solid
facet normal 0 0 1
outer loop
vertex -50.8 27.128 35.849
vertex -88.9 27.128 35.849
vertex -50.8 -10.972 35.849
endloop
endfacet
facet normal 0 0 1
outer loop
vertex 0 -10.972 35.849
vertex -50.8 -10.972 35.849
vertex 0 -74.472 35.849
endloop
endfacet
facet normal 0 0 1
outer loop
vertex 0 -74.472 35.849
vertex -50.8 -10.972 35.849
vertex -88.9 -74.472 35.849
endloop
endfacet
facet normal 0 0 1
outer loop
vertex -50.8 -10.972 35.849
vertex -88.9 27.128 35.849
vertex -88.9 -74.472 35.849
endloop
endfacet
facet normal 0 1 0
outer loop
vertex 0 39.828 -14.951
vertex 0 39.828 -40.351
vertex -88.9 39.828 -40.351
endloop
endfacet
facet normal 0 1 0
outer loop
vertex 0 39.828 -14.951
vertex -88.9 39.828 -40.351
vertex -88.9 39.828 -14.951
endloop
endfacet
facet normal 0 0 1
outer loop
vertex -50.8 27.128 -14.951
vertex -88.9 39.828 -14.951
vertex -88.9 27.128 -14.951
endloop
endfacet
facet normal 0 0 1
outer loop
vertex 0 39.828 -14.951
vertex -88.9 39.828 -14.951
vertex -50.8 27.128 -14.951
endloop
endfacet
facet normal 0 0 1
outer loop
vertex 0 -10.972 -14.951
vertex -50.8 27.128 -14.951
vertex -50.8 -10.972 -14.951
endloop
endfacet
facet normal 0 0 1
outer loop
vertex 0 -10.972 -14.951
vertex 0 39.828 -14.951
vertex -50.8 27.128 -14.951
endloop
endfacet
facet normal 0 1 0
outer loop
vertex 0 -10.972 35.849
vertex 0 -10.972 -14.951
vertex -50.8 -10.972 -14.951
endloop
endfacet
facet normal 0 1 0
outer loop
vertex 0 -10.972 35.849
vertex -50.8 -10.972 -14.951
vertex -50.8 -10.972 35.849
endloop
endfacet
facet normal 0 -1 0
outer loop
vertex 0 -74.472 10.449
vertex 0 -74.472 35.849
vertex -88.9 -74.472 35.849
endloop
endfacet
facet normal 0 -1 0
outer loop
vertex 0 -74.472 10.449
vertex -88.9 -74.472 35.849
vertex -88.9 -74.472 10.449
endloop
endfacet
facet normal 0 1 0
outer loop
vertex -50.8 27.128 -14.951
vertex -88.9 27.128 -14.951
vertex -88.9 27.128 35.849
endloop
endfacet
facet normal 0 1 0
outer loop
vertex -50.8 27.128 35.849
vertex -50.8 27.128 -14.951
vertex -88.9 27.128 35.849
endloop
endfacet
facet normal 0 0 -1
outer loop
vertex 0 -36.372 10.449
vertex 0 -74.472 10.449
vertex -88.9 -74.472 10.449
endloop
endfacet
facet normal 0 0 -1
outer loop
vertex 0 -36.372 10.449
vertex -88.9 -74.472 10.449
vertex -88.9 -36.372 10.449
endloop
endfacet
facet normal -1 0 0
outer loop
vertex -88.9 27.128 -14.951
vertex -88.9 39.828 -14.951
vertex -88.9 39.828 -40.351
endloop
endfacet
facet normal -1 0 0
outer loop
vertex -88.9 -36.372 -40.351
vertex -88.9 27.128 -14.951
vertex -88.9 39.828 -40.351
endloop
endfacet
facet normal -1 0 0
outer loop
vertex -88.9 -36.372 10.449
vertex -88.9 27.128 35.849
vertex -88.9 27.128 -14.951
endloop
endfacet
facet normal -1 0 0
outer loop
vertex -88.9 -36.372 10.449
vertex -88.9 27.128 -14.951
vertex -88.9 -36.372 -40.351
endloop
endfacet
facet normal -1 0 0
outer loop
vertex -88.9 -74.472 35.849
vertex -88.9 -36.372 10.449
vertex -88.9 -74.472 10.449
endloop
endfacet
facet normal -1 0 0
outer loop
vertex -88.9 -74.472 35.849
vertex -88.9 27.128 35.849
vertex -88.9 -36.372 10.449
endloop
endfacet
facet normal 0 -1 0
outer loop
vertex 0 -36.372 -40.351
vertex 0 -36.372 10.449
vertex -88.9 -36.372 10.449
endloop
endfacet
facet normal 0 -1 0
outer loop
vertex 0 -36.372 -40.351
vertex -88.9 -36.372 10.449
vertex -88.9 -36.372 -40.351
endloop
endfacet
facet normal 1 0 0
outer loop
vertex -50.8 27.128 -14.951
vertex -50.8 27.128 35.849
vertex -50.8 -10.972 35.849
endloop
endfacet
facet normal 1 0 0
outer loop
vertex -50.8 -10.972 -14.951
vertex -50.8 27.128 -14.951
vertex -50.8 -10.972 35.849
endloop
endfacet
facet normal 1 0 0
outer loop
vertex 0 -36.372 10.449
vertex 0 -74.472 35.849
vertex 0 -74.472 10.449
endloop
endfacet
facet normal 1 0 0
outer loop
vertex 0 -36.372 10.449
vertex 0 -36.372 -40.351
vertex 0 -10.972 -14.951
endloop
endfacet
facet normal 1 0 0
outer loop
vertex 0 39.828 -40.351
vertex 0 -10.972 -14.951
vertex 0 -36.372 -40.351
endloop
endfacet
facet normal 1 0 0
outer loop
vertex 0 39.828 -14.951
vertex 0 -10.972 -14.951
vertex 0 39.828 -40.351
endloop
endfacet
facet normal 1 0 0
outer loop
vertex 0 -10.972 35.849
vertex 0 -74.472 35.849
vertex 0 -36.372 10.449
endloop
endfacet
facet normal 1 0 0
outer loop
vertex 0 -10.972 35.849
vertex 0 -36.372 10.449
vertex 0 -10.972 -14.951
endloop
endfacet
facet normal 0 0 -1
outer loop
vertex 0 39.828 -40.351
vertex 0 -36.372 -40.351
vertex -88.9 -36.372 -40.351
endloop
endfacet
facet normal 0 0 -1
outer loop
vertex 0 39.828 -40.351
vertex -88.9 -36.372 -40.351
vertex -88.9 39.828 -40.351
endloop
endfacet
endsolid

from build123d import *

# Parameters (mm, degrees)
F1_DEPTH = 88.9
F2_W     = 38.1
F2_H     = 50.8
F3_DEPTH = 38.1


with BuildPart() as f1:
    # F0 (on Right) → F1 (new body)
    with BuildSketch(Plane.YZ):
        Polygon((-10.972409, 35.849495), (-74.472409, 35.849495), (-74.472409, 10.449495), (-36.372409, 10.449495), (-36.372409, -40.350505), (39.827591, -40.350505), (39.827591, -14.950505), (-10.972409, -14.950505), align=None)
    extrude(amount=-F1_DEPTH)

    # F2 (on face) → F3 (join)
    with BuildSketch(Plane(origin=(-88.9, 0, 0), x_dir=(0, -1, 0), z_dir=(-1, 0, 0))):
        with Locations((-8.077591, 10.449495)):
            Rectangle(F2_W, F2_H)
    extrude(amount=-F3_DEPTH)


solid = f1.part
